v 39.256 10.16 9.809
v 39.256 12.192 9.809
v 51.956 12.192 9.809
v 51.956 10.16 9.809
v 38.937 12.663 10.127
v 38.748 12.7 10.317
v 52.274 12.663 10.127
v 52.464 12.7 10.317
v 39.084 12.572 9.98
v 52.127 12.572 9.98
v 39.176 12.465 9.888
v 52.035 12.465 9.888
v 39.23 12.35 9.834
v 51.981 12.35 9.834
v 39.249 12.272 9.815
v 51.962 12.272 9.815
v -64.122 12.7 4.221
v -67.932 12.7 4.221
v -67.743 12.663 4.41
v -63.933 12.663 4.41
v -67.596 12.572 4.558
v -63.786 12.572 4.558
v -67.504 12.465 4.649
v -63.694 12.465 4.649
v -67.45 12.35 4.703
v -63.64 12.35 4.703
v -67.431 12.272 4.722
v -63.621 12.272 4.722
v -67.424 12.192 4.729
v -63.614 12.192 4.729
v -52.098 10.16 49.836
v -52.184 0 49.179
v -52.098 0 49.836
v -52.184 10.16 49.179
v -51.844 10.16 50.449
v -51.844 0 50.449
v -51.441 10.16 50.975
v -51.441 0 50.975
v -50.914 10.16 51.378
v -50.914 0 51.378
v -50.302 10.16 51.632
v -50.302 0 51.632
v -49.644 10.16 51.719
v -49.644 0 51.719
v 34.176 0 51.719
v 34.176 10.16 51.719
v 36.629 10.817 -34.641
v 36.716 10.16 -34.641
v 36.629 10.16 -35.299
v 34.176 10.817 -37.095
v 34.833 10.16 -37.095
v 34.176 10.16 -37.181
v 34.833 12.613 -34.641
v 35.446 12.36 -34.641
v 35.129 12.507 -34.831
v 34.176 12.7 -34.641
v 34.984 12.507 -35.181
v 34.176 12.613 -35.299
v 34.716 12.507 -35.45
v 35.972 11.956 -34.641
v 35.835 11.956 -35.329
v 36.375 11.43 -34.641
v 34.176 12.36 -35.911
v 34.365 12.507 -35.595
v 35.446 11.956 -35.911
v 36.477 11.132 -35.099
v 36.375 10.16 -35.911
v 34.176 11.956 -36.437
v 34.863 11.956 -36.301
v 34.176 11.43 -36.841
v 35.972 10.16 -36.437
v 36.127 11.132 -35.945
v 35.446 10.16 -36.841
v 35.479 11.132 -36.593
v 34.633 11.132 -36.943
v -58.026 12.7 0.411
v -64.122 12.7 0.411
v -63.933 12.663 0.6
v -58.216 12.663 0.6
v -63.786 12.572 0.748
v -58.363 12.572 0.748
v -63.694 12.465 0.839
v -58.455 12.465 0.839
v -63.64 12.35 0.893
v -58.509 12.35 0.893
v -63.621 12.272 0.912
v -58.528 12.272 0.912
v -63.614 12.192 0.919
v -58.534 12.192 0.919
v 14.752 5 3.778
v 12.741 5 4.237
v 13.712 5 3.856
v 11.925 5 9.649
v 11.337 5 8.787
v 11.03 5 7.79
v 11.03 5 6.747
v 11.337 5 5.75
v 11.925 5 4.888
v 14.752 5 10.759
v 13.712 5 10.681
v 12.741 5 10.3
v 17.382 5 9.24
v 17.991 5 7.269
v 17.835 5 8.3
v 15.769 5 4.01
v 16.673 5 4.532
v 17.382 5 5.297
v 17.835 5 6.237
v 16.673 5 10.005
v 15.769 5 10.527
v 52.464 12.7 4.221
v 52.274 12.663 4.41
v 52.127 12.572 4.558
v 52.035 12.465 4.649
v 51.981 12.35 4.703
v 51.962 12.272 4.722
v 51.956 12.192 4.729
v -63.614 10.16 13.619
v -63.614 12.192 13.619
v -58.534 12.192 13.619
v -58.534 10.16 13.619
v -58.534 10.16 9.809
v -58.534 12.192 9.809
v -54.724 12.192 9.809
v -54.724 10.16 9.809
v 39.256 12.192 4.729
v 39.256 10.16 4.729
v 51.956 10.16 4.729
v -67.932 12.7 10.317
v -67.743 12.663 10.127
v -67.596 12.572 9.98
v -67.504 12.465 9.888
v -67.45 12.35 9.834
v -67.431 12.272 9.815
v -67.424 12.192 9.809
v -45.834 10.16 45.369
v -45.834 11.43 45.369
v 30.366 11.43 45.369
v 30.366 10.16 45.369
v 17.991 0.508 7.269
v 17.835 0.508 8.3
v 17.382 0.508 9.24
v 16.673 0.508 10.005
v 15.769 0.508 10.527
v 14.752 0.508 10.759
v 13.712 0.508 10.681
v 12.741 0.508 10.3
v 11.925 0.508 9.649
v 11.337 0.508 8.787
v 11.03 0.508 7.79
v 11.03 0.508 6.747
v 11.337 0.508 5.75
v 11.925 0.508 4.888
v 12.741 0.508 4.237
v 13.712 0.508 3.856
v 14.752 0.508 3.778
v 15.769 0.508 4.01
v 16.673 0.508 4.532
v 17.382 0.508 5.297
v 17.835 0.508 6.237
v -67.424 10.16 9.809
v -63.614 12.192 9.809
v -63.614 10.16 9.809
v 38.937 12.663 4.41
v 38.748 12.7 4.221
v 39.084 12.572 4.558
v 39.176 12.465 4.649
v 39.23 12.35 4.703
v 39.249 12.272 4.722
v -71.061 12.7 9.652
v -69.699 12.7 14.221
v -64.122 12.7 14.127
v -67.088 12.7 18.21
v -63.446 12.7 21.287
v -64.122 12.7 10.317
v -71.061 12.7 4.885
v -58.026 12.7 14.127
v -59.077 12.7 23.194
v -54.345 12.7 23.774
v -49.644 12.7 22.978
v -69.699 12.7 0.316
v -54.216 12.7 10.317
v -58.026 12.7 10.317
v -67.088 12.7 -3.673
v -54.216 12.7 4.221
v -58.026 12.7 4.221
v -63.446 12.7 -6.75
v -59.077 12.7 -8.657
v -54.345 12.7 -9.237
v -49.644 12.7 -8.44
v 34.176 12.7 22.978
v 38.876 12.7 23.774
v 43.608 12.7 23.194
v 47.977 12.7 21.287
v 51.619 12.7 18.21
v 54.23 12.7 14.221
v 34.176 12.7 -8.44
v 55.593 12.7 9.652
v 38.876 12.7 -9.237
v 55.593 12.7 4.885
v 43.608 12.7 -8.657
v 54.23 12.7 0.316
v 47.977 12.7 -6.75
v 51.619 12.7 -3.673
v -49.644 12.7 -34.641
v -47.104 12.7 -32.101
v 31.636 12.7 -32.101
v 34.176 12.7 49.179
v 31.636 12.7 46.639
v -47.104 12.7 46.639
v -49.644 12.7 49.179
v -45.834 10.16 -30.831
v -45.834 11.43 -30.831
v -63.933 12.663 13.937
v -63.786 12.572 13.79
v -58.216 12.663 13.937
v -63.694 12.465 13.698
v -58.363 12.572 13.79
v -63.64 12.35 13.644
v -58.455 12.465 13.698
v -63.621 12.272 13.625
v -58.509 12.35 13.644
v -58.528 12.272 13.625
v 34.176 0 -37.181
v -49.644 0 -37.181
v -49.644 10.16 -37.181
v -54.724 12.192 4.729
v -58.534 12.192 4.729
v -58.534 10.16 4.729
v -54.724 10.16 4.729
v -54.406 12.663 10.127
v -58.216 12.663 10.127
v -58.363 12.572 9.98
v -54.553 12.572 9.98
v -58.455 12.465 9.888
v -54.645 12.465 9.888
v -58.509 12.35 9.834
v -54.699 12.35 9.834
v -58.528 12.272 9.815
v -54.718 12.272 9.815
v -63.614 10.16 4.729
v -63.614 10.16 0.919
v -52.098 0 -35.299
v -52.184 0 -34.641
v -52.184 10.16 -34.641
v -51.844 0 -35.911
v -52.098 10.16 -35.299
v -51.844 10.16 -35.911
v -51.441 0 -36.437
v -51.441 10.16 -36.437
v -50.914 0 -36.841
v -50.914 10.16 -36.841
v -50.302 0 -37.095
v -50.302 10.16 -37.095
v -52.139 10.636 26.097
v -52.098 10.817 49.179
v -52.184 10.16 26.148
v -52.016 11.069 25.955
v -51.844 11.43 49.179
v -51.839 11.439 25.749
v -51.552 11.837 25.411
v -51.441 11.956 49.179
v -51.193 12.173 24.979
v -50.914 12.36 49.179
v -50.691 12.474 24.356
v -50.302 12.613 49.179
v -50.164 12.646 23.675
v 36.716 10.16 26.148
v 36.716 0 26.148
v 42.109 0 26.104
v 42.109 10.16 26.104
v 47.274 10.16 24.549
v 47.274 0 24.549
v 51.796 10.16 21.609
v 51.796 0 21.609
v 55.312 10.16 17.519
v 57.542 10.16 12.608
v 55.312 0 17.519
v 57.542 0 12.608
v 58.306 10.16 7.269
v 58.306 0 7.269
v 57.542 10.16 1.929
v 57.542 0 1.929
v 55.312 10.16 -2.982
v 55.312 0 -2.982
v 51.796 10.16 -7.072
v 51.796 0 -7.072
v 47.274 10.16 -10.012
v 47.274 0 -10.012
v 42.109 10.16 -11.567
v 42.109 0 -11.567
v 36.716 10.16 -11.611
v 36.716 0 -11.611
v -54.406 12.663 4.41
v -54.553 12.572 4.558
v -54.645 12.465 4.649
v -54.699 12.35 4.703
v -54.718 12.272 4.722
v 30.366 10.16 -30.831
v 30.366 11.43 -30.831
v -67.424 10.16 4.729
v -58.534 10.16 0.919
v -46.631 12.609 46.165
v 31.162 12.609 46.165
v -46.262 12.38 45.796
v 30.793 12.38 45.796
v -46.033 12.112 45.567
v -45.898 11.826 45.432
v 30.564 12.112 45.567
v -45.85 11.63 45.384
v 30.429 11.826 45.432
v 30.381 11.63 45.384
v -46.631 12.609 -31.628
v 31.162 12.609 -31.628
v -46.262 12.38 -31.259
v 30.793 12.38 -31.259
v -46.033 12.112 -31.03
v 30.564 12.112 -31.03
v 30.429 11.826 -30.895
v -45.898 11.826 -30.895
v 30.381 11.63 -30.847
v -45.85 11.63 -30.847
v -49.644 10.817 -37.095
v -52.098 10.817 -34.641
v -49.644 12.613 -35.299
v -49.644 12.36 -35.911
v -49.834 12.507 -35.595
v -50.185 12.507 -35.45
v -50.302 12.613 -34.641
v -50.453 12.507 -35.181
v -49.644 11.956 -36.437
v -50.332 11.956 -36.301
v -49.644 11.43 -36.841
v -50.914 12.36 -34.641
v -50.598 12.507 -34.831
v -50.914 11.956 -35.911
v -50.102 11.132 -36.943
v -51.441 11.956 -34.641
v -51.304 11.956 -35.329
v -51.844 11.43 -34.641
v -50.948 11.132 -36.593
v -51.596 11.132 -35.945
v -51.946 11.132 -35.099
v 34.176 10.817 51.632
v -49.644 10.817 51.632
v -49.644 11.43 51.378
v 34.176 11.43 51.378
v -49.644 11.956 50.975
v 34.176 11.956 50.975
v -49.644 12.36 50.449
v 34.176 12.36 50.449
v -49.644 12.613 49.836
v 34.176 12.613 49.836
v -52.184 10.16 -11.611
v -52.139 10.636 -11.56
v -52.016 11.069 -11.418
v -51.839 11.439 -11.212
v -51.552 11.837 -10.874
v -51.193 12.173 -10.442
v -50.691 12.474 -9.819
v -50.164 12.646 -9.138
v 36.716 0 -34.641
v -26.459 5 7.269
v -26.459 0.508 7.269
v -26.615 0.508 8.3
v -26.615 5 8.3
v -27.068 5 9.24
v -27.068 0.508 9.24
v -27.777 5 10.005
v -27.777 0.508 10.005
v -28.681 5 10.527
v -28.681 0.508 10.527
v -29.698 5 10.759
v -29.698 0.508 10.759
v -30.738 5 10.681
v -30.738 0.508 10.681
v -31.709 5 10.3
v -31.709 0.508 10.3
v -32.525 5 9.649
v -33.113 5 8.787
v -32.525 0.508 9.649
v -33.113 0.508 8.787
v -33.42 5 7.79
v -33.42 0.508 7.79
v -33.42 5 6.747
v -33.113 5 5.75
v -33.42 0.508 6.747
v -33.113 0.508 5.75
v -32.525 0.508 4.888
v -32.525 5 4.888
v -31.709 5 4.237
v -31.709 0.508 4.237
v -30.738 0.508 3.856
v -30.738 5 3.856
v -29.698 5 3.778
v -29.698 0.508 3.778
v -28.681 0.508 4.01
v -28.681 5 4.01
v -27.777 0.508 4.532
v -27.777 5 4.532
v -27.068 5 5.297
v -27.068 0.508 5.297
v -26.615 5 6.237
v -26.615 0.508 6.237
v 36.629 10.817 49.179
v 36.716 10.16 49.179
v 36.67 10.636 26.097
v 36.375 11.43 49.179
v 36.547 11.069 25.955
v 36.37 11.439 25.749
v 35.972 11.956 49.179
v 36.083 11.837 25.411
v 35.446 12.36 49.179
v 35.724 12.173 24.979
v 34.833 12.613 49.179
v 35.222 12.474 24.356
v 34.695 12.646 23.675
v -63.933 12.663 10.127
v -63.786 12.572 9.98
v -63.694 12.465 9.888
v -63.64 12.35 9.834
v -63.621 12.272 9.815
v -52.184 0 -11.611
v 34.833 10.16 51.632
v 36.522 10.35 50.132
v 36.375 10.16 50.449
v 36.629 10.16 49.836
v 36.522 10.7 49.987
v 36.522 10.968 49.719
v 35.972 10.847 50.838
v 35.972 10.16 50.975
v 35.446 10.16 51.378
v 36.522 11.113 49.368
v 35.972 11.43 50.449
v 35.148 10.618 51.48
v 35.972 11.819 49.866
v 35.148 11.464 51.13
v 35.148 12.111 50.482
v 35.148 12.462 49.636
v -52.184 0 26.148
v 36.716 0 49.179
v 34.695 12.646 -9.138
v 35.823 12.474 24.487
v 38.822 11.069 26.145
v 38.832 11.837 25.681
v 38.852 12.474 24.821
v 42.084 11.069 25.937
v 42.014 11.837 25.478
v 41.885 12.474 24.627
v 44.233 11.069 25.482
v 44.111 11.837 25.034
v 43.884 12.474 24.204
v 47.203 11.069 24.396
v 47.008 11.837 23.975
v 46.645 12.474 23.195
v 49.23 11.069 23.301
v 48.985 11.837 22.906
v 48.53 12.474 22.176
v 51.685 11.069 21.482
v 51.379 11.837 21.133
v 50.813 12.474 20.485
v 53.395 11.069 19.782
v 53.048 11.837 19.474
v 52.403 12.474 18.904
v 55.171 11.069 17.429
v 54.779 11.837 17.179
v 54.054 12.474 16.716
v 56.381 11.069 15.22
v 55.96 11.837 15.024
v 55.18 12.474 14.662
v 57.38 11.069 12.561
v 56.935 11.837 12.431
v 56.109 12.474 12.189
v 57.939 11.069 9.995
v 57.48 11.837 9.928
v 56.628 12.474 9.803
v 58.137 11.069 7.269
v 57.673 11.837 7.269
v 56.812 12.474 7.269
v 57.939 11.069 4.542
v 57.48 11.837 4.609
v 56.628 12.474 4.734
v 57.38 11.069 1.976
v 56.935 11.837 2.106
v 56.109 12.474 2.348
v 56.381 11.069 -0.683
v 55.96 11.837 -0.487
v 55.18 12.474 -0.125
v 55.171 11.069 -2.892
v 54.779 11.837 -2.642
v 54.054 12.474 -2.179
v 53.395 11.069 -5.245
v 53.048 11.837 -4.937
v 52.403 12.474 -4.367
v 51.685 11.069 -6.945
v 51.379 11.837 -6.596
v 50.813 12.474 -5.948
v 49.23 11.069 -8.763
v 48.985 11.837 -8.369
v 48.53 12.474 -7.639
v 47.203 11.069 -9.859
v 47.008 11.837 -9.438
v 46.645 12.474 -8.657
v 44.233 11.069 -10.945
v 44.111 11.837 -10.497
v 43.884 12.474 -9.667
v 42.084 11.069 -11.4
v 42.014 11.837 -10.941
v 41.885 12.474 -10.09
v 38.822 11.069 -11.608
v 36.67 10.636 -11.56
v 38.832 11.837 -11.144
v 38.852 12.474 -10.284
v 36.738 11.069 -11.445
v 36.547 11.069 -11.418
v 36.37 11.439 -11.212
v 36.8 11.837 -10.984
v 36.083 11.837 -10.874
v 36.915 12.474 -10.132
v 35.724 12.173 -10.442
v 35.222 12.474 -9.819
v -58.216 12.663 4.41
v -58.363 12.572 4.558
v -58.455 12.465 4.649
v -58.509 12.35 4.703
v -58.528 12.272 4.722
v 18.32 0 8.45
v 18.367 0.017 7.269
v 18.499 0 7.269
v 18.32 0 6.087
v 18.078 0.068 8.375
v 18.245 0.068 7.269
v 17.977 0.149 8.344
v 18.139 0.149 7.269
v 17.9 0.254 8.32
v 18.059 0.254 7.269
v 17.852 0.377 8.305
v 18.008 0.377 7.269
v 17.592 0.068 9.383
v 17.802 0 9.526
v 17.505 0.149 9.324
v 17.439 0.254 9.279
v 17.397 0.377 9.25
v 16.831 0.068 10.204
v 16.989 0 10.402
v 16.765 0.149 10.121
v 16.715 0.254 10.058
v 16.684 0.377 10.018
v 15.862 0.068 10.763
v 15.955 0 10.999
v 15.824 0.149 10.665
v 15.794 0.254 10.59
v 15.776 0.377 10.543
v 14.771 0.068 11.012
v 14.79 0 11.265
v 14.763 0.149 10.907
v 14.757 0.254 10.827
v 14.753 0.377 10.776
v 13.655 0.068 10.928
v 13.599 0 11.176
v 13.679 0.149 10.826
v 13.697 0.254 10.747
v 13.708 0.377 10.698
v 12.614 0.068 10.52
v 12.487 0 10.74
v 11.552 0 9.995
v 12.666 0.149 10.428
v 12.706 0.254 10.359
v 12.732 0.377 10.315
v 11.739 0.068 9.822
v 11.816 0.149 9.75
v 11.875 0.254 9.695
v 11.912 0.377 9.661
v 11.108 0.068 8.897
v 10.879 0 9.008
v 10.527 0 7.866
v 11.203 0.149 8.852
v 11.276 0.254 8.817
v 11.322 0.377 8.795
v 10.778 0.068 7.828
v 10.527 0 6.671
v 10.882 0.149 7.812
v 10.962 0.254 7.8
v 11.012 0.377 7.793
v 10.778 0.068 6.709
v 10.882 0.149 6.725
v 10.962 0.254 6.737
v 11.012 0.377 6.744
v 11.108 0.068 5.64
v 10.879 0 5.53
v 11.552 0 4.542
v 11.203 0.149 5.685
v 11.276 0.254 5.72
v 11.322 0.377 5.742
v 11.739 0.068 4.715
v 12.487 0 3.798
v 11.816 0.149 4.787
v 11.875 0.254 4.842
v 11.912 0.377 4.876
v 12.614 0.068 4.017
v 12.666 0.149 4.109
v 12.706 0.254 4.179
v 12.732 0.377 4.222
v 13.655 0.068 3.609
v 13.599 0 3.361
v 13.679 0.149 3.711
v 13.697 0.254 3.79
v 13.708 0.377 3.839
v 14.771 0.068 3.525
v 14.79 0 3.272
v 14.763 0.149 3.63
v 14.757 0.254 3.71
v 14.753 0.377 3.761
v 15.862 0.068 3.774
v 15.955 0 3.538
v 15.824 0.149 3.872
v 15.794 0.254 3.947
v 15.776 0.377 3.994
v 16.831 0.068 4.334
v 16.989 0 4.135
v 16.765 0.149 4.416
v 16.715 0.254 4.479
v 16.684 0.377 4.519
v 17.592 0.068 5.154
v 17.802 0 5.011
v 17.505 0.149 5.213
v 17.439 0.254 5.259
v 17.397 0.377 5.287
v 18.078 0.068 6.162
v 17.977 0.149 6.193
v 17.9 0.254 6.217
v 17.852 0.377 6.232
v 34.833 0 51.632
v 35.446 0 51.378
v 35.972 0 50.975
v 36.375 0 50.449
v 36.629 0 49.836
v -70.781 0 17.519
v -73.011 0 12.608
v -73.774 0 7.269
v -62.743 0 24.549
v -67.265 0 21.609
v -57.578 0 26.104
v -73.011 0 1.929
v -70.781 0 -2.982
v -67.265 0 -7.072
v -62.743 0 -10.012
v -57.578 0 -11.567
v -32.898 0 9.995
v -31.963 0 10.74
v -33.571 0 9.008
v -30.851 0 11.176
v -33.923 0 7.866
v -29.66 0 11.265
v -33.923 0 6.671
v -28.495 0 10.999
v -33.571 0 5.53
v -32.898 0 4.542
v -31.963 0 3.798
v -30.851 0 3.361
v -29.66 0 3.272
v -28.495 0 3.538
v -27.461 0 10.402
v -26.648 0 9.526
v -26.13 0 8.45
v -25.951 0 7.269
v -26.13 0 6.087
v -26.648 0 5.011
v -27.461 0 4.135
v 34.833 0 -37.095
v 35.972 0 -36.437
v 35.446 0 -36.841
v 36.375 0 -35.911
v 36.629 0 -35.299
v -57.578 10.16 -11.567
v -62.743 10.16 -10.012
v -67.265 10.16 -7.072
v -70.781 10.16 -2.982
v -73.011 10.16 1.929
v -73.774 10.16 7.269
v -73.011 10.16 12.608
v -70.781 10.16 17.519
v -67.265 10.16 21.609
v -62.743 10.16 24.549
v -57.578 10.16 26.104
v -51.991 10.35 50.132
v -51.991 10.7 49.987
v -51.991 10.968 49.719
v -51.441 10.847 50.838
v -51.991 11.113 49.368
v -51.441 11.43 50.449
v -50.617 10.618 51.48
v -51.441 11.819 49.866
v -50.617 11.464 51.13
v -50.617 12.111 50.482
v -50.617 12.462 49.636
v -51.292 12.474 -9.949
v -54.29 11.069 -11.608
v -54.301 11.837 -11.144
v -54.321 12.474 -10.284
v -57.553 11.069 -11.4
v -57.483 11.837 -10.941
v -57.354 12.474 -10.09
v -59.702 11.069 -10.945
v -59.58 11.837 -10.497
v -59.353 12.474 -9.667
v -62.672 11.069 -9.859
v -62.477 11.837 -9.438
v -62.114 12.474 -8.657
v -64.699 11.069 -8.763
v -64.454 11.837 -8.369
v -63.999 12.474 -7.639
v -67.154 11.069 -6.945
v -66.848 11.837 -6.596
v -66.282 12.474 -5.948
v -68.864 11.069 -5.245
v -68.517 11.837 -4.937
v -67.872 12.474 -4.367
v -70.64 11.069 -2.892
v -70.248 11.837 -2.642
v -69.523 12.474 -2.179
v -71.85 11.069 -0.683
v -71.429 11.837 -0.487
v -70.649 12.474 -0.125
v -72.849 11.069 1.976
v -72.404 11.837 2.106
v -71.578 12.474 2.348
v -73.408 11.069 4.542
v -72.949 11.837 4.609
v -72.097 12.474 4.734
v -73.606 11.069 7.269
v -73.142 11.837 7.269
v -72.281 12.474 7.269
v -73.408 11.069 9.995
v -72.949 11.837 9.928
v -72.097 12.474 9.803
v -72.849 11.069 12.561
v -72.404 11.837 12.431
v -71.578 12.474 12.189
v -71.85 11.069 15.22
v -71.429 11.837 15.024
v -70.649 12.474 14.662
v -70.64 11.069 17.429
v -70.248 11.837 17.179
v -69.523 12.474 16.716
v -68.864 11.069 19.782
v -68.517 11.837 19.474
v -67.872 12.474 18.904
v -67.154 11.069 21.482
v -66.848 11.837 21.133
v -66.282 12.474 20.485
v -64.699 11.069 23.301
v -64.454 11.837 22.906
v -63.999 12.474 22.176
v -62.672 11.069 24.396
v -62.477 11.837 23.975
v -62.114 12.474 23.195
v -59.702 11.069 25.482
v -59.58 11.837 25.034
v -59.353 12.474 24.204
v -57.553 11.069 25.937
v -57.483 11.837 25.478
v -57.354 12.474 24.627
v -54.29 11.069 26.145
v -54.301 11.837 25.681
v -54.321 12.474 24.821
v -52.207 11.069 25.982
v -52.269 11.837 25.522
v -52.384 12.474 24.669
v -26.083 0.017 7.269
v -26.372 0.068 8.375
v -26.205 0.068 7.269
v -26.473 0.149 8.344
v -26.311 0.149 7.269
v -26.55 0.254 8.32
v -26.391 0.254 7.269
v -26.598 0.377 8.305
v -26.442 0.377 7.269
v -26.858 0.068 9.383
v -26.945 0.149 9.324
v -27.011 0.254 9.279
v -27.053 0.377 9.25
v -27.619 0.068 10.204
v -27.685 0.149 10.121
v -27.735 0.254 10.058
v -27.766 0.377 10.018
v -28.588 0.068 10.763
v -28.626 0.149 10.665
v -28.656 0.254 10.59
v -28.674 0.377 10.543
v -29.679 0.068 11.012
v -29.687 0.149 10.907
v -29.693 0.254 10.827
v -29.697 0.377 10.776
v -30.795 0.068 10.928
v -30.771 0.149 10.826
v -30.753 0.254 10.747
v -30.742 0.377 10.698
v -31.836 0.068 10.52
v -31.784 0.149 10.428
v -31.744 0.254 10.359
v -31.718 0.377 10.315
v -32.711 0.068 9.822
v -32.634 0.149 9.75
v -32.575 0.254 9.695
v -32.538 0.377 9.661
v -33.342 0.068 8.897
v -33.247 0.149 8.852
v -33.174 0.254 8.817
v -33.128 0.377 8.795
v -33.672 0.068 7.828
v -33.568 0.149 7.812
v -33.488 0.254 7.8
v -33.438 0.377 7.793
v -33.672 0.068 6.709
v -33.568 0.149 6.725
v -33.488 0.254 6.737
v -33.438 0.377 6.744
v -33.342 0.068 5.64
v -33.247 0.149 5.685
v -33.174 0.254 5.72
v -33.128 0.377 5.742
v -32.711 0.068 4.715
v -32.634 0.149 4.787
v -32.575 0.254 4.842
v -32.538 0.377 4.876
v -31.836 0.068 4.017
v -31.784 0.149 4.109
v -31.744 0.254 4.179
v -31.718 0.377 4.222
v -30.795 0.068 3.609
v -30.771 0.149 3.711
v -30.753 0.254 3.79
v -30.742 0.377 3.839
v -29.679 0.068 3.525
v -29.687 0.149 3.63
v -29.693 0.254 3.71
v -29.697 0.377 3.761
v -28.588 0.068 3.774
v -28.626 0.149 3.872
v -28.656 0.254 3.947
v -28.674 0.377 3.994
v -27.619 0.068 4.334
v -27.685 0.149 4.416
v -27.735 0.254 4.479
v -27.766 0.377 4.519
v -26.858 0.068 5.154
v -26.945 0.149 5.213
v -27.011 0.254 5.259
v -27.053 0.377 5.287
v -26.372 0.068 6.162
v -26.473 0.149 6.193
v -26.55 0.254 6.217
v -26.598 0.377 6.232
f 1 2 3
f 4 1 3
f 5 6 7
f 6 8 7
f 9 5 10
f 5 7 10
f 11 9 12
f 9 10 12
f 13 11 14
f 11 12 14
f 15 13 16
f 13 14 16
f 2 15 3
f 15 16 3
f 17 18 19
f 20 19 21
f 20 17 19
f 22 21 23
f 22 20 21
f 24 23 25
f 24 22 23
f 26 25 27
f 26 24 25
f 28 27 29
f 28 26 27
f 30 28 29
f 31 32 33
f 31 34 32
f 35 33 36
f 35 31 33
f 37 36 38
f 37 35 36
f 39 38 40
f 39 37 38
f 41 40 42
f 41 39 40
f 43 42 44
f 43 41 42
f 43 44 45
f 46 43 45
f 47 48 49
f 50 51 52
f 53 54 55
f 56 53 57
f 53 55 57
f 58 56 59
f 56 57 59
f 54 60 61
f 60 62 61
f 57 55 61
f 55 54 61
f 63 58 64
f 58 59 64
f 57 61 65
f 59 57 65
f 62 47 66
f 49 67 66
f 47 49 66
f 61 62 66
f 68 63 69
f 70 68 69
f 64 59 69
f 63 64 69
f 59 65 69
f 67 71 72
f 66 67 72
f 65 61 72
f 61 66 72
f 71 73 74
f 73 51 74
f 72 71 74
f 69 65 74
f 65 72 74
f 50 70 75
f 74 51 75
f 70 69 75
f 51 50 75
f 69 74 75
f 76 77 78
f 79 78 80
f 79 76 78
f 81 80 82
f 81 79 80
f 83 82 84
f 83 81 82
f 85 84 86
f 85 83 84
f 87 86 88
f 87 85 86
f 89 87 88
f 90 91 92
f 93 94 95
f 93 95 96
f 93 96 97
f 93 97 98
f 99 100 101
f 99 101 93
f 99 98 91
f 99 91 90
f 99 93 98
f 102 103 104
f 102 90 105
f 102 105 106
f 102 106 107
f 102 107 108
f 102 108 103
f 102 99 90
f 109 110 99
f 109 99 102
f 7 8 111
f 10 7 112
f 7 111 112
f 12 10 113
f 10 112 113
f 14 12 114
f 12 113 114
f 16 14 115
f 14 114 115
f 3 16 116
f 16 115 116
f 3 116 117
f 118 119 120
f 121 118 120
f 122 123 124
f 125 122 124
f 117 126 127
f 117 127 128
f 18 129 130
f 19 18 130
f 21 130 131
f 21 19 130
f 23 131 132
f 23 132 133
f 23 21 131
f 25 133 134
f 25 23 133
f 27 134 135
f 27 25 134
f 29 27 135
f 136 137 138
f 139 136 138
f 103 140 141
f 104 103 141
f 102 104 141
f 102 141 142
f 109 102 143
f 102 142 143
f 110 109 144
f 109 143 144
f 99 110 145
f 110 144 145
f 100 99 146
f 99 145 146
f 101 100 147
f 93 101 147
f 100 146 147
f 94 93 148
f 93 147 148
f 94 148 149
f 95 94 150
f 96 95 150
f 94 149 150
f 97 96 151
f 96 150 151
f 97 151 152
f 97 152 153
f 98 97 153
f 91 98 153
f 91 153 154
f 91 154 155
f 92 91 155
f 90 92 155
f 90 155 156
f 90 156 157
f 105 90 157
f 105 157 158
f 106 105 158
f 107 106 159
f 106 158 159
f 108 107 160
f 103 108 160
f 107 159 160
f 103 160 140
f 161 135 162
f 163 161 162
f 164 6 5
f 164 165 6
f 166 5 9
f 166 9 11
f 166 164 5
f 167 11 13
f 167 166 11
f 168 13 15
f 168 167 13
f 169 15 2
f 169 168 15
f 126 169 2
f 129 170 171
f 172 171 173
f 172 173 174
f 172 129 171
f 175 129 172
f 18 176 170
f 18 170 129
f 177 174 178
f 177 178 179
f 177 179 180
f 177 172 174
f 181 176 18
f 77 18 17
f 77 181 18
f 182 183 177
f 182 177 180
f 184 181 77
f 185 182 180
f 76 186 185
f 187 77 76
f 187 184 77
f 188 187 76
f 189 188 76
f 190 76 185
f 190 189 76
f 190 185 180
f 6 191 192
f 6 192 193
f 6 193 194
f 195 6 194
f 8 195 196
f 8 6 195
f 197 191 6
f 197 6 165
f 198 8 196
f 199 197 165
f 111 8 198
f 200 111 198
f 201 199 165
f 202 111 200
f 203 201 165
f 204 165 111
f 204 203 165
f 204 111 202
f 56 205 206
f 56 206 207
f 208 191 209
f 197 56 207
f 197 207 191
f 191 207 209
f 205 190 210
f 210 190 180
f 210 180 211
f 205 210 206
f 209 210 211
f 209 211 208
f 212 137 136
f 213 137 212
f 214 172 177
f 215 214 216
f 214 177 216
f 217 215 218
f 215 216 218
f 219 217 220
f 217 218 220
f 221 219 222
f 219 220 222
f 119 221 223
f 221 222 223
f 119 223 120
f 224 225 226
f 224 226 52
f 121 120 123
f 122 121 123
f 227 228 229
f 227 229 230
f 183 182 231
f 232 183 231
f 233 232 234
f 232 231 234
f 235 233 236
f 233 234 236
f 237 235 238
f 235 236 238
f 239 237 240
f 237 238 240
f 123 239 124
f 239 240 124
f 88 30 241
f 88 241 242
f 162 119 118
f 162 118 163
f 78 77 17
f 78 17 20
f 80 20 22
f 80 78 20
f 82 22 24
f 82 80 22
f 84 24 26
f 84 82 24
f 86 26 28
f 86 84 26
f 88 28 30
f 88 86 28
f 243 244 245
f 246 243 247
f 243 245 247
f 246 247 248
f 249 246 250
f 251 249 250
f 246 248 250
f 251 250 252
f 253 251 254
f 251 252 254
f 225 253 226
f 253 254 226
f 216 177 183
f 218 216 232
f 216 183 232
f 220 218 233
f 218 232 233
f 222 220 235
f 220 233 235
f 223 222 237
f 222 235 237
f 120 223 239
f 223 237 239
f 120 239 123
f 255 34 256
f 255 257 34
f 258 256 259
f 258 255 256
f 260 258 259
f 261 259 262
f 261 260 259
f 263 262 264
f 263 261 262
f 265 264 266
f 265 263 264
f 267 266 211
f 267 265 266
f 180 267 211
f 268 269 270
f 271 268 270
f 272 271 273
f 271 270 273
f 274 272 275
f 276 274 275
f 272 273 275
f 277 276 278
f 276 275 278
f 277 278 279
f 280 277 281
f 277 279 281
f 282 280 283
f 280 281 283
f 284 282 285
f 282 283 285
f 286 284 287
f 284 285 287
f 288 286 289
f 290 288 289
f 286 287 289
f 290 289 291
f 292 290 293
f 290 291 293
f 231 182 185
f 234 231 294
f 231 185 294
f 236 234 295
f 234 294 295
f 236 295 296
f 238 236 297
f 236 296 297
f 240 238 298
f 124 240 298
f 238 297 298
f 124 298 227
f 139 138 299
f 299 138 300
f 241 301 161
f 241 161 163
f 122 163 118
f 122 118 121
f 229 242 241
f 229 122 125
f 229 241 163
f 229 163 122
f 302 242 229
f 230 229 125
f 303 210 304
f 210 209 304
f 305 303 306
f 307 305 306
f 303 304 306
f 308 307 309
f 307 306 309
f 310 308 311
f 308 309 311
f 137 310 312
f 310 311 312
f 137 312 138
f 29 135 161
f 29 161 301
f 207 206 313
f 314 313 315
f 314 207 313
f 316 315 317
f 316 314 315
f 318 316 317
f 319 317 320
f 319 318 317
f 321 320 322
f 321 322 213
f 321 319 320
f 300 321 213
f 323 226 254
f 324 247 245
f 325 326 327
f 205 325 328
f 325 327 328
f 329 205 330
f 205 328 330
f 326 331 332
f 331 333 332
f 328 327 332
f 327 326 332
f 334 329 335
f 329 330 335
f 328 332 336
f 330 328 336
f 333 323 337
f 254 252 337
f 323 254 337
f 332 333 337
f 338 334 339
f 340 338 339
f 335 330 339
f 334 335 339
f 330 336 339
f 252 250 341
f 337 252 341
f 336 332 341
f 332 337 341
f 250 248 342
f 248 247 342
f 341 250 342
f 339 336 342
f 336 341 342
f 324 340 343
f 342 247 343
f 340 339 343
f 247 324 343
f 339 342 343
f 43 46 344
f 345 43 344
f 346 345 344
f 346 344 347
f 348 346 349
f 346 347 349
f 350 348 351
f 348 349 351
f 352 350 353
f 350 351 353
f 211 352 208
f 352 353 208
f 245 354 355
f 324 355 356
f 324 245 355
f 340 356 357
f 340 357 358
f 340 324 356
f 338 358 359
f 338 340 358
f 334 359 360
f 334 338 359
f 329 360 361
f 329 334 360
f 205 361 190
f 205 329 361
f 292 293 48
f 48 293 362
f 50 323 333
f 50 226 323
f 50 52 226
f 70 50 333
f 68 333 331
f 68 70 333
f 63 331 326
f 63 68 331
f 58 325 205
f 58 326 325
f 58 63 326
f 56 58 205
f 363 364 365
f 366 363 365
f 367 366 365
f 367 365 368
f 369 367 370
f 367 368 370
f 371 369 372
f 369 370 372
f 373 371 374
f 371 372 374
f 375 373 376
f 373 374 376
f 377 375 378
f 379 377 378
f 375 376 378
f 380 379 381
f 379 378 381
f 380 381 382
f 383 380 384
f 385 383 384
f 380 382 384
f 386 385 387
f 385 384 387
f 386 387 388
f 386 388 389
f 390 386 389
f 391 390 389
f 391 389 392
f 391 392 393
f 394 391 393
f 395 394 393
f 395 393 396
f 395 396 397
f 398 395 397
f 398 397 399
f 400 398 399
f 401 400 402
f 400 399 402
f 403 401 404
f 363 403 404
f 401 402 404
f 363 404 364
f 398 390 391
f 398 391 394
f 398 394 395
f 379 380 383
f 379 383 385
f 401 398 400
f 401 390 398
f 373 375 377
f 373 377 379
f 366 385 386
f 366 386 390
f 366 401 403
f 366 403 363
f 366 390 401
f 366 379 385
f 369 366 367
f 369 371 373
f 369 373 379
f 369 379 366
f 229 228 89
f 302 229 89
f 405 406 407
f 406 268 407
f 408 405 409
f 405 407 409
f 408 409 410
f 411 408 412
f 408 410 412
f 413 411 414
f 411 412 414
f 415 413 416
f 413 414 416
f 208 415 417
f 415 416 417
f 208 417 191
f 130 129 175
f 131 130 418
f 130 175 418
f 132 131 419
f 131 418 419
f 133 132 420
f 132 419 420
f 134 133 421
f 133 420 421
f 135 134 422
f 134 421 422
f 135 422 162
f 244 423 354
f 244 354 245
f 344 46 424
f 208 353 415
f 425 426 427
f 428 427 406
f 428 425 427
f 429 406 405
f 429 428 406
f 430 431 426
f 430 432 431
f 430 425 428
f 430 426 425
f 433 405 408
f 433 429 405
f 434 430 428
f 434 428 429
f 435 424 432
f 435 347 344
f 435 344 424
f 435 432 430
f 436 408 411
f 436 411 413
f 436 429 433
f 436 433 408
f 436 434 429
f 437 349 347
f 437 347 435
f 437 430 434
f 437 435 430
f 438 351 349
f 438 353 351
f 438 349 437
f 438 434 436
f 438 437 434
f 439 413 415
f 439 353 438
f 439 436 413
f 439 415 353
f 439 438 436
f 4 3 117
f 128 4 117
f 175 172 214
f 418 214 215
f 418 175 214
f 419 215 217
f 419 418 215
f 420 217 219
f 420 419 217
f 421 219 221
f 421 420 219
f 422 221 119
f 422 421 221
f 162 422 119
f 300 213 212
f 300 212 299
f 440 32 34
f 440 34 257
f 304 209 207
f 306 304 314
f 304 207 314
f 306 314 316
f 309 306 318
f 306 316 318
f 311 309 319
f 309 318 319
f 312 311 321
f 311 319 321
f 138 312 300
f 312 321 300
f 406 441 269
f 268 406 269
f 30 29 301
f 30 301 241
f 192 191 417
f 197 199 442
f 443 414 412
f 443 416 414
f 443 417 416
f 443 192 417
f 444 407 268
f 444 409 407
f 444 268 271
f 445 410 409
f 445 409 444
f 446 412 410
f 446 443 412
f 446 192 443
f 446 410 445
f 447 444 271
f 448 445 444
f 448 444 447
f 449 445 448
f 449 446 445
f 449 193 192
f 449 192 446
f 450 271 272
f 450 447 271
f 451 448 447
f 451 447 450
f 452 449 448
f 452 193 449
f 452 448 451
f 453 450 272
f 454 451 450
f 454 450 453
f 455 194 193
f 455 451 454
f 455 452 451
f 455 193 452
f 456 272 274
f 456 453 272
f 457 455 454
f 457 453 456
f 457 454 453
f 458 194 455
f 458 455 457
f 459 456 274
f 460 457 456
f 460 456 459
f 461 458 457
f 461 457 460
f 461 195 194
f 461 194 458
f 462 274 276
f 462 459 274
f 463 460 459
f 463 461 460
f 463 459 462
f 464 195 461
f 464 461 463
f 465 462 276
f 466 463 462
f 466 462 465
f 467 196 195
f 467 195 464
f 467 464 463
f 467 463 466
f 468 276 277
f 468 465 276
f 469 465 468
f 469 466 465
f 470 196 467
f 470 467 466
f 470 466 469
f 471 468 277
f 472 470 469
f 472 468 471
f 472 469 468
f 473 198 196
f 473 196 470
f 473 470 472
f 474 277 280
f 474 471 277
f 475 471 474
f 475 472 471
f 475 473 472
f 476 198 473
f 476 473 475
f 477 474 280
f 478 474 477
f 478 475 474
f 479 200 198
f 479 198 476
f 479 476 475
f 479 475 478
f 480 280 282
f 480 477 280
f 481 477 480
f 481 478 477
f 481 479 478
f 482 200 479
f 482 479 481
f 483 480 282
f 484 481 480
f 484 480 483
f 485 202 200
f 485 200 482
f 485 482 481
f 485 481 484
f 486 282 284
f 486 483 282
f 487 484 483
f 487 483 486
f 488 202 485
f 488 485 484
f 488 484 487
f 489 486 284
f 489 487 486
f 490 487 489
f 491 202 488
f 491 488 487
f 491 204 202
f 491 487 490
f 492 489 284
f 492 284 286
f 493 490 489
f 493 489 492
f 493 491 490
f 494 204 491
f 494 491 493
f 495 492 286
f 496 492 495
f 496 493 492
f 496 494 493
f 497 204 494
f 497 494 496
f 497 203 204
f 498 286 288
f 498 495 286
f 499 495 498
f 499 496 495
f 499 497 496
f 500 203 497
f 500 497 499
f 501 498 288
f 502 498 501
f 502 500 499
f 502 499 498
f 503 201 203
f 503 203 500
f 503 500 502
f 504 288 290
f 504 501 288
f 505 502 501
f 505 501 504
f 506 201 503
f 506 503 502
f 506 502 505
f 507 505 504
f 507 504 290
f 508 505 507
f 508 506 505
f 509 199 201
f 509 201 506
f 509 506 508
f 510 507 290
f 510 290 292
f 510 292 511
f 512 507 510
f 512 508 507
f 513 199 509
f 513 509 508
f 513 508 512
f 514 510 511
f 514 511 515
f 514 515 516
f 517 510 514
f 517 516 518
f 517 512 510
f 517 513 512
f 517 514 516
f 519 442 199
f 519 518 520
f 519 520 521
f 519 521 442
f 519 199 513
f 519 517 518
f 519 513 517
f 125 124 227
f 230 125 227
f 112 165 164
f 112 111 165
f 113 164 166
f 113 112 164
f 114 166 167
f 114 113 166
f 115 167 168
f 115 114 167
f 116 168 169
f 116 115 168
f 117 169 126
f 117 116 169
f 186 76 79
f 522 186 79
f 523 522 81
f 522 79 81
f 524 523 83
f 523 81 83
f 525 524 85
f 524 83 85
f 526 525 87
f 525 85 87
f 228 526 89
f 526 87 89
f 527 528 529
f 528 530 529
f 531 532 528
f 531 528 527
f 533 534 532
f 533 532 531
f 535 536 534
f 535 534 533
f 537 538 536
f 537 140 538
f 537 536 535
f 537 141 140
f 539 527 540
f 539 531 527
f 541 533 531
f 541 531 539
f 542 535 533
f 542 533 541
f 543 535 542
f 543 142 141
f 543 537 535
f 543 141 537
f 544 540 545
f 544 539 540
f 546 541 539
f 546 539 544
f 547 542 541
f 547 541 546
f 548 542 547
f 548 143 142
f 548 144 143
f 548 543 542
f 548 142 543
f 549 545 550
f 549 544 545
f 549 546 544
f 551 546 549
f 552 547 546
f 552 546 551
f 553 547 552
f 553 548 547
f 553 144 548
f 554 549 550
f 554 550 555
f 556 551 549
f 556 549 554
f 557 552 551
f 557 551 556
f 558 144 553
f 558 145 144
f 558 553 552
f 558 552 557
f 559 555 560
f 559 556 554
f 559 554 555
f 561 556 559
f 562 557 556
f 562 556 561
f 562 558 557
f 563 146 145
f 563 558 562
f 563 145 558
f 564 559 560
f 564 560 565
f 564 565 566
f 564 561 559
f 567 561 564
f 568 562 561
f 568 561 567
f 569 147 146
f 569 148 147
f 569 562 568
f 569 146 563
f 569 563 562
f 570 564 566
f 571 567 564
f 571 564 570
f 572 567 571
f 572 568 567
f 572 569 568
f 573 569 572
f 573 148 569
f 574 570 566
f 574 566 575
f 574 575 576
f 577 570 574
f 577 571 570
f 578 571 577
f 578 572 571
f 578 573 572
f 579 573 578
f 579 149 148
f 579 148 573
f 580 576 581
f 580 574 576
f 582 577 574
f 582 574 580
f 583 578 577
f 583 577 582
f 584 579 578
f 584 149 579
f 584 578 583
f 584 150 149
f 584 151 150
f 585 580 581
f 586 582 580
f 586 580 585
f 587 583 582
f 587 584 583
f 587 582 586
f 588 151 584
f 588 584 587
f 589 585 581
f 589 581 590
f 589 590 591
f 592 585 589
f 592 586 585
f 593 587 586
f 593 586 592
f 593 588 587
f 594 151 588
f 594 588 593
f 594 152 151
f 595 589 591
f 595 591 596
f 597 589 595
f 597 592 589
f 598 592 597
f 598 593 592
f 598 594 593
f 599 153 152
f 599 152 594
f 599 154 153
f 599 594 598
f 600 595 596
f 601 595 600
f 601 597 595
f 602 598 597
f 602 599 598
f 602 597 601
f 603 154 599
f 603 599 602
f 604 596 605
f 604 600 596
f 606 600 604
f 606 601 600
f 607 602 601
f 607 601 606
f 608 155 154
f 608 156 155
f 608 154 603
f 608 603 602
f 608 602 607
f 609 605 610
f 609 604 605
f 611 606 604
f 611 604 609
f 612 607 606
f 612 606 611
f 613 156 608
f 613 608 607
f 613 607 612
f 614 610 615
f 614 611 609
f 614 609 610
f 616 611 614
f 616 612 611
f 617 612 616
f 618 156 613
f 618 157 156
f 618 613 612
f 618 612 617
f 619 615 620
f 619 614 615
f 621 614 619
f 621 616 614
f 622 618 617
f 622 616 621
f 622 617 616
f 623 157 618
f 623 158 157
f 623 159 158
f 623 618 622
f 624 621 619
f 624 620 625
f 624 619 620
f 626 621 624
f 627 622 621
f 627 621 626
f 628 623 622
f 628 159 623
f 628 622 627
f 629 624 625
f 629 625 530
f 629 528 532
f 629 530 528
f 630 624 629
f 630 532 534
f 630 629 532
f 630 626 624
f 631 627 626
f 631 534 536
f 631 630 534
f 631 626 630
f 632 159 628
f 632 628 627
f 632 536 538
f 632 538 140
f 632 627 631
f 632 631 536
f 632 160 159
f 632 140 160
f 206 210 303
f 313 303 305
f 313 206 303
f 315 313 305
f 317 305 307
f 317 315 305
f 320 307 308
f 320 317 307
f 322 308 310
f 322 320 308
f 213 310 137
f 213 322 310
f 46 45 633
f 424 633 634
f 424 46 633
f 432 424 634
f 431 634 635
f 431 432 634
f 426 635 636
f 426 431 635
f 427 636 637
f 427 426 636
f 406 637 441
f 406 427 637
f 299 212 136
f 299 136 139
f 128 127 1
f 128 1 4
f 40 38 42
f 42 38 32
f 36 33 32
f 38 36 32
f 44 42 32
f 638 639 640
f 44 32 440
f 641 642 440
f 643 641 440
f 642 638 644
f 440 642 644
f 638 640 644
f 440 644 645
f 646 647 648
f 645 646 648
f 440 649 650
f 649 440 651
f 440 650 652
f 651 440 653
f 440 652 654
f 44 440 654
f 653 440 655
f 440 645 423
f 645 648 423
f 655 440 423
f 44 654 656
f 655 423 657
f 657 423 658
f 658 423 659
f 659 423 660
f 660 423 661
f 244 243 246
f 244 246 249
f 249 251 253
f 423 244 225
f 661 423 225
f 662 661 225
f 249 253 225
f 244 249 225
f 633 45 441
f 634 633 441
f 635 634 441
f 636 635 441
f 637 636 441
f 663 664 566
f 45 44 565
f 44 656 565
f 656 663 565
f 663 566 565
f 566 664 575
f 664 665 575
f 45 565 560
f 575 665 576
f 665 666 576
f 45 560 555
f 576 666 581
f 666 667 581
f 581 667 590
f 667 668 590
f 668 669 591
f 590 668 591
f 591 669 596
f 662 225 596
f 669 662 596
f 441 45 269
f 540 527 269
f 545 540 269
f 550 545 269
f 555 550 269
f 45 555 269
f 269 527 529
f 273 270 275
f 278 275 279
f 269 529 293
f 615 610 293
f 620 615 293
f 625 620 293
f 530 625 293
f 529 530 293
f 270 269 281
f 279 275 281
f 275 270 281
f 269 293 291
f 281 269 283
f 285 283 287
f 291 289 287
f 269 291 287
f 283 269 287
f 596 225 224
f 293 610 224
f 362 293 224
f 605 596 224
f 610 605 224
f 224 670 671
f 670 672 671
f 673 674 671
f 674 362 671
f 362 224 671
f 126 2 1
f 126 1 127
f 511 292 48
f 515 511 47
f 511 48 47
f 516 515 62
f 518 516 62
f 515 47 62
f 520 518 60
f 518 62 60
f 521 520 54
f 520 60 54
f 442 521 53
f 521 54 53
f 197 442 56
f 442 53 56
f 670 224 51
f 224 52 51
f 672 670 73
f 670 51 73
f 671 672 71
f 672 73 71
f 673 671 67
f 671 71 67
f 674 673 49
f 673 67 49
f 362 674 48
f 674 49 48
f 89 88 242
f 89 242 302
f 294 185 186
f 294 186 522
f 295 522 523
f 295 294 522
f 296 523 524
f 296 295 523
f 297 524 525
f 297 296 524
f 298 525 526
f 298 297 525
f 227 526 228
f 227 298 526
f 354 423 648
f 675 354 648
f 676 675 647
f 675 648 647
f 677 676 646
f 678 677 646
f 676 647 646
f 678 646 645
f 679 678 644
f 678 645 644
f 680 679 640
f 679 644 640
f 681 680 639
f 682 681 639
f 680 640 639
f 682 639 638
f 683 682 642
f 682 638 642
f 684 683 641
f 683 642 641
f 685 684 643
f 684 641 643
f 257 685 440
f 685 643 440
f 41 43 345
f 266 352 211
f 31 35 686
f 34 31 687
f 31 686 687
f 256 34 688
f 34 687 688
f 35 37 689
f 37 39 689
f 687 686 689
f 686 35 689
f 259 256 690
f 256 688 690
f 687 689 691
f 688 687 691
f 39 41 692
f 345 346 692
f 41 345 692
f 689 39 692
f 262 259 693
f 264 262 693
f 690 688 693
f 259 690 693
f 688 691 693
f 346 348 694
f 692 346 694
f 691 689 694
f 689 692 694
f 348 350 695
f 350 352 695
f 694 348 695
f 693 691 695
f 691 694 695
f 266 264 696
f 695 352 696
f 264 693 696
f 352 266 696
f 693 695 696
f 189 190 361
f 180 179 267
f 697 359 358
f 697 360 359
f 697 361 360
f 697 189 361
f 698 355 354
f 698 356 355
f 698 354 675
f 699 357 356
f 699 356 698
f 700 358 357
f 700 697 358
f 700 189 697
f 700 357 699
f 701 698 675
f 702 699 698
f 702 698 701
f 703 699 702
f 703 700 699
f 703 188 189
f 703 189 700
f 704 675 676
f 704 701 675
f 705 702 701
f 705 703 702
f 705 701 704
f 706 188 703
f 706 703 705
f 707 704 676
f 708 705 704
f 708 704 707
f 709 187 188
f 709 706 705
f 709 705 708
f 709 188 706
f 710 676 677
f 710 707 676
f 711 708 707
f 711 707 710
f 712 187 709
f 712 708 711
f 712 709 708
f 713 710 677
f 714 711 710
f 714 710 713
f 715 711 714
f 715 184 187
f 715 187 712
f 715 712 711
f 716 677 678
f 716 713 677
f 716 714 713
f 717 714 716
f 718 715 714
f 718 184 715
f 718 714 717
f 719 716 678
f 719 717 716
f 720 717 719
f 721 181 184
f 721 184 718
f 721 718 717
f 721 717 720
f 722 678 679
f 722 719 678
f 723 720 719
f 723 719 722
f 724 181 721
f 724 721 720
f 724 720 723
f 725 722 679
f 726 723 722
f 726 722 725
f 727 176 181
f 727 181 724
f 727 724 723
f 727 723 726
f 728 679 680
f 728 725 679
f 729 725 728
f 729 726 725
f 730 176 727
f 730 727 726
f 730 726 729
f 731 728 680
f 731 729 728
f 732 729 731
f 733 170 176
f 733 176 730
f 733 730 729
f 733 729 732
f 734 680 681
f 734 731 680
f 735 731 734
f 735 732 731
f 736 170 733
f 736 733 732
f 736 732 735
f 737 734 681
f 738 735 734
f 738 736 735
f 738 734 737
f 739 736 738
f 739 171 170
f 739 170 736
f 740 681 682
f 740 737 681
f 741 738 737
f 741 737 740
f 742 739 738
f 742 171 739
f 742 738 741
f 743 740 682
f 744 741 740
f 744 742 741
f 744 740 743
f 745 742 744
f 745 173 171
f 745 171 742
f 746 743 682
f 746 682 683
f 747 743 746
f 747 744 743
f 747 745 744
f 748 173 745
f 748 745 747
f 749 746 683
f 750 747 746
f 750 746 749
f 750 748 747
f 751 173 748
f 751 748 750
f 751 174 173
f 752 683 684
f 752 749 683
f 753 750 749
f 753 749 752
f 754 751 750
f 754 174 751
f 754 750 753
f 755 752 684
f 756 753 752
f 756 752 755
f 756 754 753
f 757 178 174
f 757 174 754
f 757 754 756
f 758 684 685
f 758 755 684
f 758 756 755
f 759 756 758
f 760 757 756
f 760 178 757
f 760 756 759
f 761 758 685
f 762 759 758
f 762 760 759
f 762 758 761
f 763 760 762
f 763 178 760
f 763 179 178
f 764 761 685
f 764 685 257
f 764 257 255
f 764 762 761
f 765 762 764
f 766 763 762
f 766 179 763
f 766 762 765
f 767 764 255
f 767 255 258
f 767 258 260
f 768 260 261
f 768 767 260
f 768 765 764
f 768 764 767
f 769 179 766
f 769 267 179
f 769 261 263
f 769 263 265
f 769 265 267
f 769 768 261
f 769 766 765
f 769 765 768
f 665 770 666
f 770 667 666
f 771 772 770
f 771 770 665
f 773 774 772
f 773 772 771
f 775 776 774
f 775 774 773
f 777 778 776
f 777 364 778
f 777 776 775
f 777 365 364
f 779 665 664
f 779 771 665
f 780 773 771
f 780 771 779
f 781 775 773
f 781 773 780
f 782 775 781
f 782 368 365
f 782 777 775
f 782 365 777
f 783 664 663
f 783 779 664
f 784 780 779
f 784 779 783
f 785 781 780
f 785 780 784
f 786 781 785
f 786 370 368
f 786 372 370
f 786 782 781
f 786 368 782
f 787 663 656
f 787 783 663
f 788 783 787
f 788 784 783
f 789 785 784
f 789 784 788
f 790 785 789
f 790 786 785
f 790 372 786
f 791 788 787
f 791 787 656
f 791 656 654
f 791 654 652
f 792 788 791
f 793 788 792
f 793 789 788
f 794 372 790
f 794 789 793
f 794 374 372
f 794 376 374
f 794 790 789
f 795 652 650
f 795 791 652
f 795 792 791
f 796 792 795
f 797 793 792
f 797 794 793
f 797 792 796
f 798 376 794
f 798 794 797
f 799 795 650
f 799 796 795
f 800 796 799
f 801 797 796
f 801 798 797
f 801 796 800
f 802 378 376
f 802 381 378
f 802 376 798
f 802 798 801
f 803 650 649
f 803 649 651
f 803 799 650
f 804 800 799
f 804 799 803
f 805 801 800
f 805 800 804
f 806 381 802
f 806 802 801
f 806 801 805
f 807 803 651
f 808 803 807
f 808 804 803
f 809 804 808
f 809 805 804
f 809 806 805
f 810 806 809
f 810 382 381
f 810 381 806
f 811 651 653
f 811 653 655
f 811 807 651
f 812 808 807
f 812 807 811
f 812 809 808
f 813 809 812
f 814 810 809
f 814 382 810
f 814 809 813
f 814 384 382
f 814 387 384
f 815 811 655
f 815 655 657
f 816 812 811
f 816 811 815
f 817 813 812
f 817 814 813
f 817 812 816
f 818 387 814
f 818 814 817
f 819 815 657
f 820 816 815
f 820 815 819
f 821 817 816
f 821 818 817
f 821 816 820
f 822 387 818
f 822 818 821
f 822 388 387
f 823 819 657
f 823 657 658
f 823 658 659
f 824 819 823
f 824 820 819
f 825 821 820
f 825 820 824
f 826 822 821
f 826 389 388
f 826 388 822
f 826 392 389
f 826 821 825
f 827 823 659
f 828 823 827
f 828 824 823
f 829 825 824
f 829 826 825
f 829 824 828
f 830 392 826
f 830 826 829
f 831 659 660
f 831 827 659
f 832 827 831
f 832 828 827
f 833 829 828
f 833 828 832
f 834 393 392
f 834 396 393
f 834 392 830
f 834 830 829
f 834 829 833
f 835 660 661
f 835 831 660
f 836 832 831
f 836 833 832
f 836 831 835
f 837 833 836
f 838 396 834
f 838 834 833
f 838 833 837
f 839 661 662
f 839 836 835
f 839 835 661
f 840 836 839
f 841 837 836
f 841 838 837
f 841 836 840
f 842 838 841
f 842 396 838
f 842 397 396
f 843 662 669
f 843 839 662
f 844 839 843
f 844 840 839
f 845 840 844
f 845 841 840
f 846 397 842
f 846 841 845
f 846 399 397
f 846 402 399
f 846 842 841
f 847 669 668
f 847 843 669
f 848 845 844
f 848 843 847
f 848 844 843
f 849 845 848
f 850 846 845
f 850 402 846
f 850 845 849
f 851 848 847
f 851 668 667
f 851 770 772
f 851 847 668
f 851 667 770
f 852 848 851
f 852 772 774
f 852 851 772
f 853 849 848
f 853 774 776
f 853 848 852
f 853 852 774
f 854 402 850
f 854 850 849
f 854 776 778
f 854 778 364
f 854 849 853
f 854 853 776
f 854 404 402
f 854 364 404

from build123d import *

# Parameters (mm, degrees)
SKETCH1_R           = 19.05
SKETCH1_W           = 88.9
SKETCH1_H           = 88.9
BOSS_EXTRUDE1_DEPTH = 12.7
SKETCH2_W           = 76.2
SKETCH2_H           = 76.2
CUT_EXTRUDE1_DEPTH  = 2.54
SKETCH3_W           = 5.08
SKETCH3_H           = 3.81
SKETCH3_W_2         = 3.81
SKETCH3_H_2         = 5.08
SKETCH3_W_3         = 12.7
CUT_EXTRUDE2_DEPTH  = 2.54
SKETCH4_R           = 3.5
CUT_EXTRUDE4_DEPTH  = 5
FILLET8_R           = 0.508
FILLET9_R           = 2.54
FILLET10_R          = 0.508
FILLET11_R          = 1.27


with BuildPart() as part:
    # Sketch1 → Boss-Extrude1 (new body)
    with BuildSketch(Plane(origin=(0, 0, 0), x_dir=(1, 0, 0), z_dir=(0, 1, 0))):
        with BuildLine():
            ThreePointArc((-35.674486373, -7.268553459), (-40.384167339, 5.271691754), (-52.184486373, 11.61135385))
            Line((-52.184486373, 11.61135385), (-52.184486373, -26.148460768))
            ThreePointArc((-52.184486373, -26.148460768), (-40.384167339, -19.808798672), (-35.674486373, -7.268553459))
        make_face()
        with BuildLine():
            Line((-52.184486373, -26.148460768), (-52.184486373, 11.61135385))
            ThreePointArc((-52.184486373, 11.61135385), (-73.774486373, -7.268553459), (-52.184486373, -26.148460768))
        make_face()
        with Locations((39.255513627, -7.268553459)):
            Circle(SKETCH1_R)
        with Locations((-54.724486373, -7.268553459)):
            Circle(SKETCH1_R)
        with Locations((-7.734486373, -7.268553459)):
            Rectangle(SKETCH1_W, SKETCH1_H)
        with BuildLine():
            ThreePointArc((58.305513627, -7.268553459), (51.79575884, 7.071765575), (36.715513627, 11.61135385))
            Line((36.715513627, 11.61135385), (36.715513627, -26.148460768))
            ThreePointArc((36.715513627, -26.148460768), (51.79575884, -21.608872493), (58.305513627, -7.268553459))
        make_face()
        with BuildLine():
            Line((36.715513627, -26.148460768), (36.715513627, 11.61135385))
            ThreePointArc((36.715513627, 11.61135385), (20.205513627, -7.268553459), (36.715513627, -26.148460768))
        make_face()
    extrude(amount=BOSS_EXTRUDE1_DEPTH)

    # Sketch2 → Cut-Extrude1 (cut)
    with BuildSketch(Plane(origin=(0, 12.7, 0), x_dir=(1, 0, 0), z_dir=(0, 1, 0))):
        with Locations((-7.734486373, -7.268553459)):
            Rectangle(SKETCH2_W, SKETCH2_H)
    extrude(amount=-CUT_EXTRUDE1_DEPTH, mode=Mode.SUBTRACT)

    # Sketch3 → Cut-Extrude2 (cut)
    with BuildSketch(Plane(origin=(0, 12.7, 0), x_dir=(1, 0, 0), z_dir=(0, 1, 0))):
        with Locations((-61.074486373, -2.823553459)):
            Rectangle(SKETCH3_W, SKETCH3_H)
        with Locations((-65.519486373, -7.268553459)):
            Rectangle(SKETCH3_W_2, SKETCH3_H_2)
        with Locations((-61.074486373, -7.268553459)):
            Rectangle(SKETCH3_W, SKETCH3_H_2)
        with Locations((-56.629486373, -7.268553459)):
            Rectangle(SKETCH3_W_2, SKETCH3_H_2)
        with Locations((-61.074486373, -11.713553459)):
            Rectangle(SKETCH3_W, SKETCH3_H)
        with Locations((45.605513627, -7.268553459)):
            Rectangle(SKETCH3_W_3, SKETCH3_H_2)
    extrude(amount=-CUT_EXTRUDE2_DEPTH, mode=Mode.SUBTRACT)

    # Sketch4 → Cut-Extrude4 (cut)
    with BuildSketch(Plane.XZ):
        with Locations((-29.959486373, 7.268553459)):
            Circle(SKETCH4_R)
        with Locations((14.490513627, 7.268553459)):
            Circle(SKETCH4_R)
    extrude(amount=-CUT_EXTRUDE4_DEPTH, mode=Mode.SUBTRACT)

    # Fillet8
    fillet8_edges = [part.edges().sort_by_distance(p)[0] for p in [
        (-33.459486373, 0, 7.268553459),
        (10.990513627, 0, 7.268553459),
    ]]
    fillet(fillet8_edges, radius=FILLET8_R)

    # Fillet9
    fillet9_edges = [part.edges().sort_by_distance(p)[0] for p in [
        (-7.734486373, 12.7, 51.718553459),
        (-52.184486373, 6.35, -37.181446541),
        (36.715513627, 6.35, -37.181446541),
        (36.715513627, 6.35, 51.718553459),
        (-52.184486373, 6.35, 51.718553459),
        (36.715513627, 12.7, 38.933507114),
        (58.305513627, 12.7, 7.268553459),
        (36.715513627, 12.7, -24.396400195),
        (-7.734486373, 12.7, -37.181446541),
        (-52.184486373, 12.7, -24.396400195),
        (-73.774486373, 12.7, 7.268553459),
        (-52.184486373, 12.7, 38.933507114),
    ]]
    fillet(fillet9_edges, radius=FILLET9_R)

    # Fillet10
    fillet10_edges = [part.edges().sort_by_distance(p)[0] for p in [
        (-63.614486373, 12.7, 2.823553459),
        (-61.074486373, 12.7, 0.918553459),
        (-54.724486373, 12.7, 7.268553459),
        (-56.629486373, 12.7, 9.808553459),
        (-63.614486373, 12.7, 11.713553459),
        (-65.519486373, 12.7, 9.808553459),
        (-65.519486373, 12.7, 4.728553459),
        (-67.424486373, 12.7, 7.268553459),
        (-61.074486373, 12.7, 13.618553459),
        (-58.534486373, 12.7, 11.713553459),
        (-56.629486373, 12.7, 4.728553459),
        (-58.534486373, 12.7, 2.823553459),
        (51.955513627, 12.7, 7.268553459),
        (45.605513627, 12.7, 4.728553459),
        (39.255513627, 12.7, 7.268553459),
        (45.605513627, 12.7, 9.808553459),
    ]]
    fillet(fillet10_edges, radius=FILLET10_R)

    # Fillet11
    fillet11_edges = [part.edges().sort_by_distance(p)[0] for p in [
        (-45.834486373, 12.7, 7.268553459),
        (-7.734486373, 12.7, 45.368553459),
        (30.365513627, 12.7, 7.268553459),
        (-7.734486373, 12.7, -30.831446541),
    ]]
    fillet(fillet11_edges, radius=FILLET11_R)


solid = part.part
